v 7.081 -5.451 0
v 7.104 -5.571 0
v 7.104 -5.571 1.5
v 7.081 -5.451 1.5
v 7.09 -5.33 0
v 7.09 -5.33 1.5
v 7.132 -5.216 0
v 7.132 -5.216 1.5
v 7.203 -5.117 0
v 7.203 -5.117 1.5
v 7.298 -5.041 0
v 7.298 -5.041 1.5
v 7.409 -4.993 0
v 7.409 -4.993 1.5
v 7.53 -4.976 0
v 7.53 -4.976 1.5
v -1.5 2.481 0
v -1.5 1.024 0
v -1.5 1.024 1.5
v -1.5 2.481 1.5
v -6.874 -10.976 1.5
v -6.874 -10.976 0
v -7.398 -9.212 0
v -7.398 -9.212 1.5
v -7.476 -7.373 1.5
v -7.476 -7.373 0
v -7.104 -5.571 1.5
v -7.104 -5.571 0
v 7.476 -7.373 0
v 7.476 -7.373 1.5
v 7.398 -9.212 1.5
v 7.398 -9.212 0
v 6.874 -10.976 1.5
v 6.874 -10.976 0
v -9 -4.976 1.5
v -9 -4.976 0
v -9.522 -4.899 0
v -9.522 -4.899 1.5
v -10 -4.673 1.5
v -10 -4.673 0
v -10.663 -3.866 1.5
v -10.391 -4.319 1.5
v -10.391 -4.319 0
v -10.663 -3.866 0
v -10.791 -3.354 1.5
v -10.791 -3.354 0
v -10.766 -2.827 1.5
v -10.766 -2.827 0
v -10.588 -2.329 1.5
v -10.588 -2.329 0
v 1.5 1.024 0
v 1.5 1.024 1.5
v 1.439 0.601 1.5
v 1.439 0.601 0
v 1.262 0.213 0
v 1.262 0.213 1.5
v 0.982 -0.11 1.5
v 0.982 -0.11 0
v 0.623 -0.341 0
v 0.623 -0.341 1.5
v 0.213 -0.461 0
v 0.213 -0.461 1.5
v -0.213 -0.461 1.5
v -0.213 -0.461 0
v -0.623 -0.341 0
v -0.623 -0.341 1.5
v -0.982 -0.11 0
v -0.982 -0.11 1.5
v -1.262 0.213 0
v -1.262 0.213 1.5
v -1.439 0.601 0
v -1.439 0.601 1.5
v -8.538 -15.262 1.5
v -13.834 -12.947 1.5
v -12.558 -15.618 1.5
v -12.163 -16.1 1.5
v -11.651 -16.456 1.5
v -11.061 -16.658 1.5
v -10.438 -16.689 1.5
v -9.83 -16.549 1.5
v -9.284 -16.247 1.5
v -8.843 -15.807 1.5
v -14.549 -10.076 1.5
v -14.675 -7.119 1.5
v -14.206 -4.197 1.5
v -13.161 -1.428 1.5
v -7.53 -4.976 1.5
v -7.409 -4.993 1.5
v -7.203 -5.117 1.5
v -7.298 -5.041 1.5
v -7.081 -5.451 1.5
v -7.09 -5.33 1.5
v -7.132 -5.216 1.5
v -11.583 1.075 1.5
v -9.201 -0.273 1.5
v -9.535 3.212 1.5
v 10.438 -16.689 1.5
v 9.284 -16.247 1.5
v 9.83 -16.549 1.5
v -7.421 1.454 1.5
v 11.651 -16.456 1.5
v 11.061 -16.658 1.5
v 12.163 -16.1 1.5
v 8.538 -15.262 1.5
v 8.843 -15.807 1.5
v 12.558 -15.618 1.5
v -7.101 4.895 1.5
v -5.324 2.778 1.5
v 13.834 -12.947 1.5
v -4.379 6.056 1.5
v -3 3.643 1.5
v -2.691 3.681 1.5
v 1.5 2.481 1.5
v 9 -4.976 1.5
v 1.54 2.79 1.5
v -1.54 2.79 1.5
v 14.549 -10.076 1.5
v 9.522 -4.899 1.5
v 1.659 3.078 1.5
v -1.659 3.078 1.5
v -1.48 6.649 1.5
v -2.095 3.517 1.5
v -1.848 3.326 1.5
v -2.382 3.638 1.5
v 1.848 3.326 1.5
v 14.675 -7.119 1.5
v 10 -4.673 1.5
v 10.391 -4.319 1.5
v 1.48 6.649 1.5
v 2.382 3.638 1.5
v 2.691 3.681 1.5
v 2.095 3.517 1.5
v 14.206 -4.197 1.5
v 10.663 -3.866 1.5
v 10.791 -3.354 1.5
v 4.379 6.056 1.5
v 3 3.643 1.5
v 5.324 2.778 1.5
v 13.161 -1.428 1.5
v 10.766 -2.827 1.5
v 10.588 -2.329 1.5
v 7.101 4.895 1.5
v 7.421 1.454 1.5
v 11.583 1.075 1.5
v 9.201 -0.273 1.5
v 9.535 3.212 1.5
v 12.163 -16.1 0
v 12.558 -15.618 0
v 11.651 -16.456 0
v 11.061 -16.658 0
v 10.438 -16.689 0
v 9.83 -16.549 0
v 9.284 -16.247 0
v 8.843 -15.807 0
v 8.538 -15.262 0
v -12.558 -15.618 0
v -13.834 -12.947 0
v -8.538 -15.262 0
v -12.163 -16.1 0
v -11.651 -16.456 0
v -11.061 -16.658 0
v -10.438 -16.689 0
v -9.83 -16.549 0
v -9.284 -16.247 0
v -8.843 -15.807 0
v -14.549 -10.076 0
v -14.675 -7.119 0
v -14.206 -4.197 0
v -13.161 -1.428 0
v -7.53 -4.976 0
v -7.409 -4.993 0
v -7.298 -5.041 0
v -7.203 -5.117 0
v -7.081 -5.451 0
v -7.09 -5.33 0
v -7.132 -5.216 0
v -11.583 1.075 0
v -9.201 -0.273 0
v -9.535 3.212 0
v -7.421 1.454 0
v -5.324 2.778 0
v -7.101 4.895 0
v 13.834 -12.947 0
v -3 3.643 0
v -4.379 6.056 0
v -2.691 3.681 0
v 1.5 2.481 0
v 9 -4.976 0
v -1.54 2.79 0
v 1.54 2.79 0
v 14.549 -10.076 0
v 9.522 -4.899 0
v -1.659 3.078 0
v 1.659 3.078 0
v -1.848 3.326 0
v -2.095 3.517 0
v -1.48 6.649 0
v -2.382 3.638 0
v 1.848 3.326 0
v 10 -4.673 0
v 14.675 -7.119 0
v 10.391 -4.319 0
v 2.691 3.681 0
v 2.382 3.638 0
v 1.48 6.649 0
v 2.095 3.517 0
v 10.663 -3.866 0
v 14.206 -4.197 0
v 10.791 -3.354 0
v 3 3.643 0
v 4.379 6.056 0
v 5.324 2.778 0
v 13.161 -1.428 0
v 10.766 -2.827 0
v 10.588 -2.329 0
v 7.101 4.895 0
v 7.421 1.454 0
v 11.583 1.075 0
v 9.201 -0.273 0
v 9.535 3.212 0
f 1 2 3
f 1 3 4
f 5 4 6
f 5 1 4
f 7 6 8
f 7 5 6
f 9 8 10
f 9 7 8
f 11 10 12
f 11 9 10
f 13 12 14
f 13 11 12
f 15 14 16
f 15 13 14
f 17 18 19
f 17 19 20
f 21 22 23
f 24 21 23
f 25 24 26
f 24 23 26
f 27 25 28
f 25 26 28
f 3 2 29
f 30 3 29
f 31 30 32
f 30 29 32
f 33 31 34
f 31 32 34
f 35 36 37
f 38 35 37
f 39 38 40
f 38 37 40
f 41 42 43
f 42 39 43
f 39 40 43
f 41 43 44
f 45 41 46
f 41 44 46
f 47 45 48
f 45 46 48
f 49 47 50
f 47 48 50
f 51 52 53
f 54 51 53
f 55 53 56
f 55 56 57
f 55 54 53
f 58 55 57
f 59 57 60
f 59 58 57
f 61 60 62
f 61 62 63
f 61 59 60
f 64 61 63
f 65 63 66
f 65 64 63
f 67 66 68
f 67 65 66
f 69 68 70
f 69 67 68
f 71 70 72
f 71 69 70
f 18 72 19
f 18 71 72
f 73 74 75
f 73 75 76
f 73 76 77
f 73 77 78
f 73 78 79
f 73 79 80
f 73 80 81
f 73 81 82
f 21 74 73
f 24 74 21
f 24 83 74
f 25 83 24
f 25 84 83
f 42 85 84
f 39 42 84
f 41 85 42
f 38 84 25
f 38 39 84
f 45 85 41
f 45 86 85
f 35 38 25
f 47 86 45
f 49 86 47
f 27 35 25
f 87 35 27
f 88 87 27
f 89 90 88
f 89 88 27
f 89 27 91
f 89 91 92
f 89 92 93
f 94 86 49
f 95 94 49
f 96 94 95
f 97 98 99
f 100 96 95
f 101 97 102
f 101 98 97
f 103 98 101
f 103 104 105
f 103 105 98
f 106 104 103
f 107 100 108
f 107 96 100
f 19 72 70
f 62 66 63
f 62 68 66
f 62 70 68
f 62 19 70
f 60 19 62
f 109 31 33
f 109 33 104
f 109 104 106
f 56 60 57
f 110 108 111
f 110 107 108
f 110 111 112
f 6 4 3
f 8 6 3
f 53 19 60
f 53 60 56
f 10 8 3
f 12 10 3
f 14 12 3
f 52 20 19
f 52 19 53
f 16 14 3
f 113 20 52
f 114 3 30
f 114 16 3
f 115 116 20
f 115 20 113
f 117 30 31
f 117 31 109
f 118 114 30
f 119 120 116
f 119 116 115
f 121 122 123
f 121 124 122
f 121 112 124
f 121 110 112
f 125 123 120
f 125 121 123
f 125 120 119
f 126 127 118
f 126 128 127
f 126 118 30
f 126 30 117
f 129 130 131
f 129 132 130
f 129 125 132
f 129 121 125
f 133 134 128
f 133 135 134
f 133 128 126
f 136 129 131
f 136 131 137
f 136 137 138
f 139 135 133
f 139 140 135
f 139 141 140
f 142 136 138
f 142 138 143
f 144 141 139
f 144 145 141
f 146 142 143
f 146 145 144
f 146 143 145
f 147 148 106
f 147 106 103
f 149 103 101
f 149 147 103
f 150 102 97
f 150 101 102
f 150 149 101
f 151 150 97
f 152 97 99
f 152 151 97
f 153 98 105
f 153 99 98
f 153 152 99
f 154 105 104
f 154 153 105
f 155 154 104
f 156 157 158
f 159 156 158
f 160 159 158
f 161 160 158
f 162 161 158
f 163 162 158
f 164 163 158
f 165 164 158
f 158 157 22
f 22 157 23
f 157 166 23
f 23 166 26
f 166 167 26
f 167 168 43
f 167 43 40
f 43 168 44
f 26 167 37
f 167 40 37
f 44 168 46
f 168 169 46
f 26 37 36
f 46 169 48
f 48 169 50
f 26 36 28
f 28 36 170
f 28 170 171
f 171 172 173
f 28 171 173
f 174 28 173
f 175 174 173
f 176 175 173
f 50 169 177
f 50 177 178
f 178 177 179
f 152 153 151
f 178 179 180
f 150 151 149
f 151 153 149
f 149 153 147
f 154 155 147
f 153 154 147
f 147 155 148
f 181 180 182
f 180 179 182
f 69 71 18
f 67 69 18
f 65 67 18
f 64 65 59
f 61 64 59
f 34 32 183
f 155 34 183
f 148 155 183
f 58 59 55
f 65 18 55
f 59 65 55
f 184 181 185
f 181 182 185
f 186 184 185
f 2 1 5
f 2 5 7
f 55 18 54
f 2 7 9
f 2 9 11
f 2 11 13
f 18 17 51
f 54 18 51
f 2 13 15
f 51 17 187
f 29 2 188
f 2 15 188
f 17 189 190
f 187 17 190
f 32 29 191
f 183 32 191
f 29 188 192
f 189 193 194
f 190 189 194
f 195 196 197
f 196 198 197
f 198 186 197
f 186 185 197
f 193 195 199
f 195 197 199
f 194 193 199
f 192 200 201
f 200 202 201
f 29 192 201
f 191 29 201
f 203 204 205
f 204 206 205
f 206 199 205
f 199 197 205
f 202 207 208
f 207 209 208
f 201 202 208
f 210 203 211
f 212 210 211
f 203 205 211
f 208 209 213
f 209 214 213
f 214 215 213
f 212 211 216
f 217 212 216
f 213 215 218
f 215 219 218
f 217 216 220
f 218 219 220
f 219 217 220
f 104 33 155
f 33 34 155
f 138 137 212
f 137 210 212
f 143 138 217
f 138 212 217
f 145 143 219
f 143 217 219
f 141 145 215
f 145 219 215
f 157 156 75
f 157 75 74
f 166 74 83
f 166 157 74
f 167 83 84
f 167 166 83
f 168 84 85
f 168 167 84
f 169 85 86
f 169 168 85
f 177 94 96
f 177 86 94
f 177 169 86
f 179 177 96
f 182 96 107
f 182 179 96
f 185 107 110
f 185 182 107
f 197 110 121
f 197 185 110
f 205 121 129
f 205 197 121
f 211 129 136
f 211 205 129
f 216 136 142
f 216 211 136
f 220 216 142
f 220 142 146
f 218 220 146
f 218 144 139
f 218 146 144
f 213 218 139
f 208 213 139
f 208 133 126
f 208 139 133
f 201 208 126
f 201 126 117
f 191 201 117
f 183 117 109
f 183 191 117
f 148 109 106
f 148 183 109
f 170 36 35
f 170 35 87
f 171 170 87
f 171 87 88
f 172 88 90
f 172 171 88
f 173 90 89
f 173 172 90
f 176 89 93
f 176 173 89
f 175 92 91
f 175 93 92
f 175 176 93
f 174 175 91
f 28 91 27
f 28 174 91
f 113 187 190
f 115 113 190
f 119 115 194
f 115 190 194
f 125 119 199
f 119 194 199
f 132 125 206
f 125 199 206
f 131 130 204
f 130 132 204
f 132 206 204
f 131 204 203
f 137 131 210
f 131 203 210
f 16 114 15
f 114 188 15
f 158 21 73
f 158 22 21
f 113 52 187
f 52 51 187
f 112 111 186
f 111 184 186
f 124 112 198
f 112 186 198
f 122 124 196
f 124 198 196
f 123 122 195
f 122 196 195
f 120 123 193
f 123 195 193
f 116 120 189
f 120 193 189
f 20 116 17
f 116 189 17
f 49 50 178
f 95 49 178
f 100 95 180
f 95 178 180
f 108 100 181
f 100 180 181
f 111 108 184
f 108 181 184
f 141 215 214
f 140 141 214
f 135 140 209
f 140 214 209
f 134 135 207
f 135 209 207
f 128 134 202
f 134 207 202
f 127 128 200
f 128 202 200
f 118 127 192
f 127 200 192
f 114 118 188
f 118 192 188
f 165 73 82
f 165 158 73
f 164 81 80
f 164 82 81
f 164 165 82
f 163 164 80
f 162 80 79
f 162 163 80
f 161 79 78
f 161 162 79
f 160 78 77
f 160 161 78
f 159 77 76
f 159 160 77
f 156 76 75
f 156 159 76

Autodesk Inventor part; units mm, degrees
ref_plane "YZ Plane" through (0, 0, 0) normal (1, 0, 0) x (0, 1, 0)
ref_plane "XZ Plane" through (0, 0, 0) normal (0, 1, 0) x (-1, 0, 0)
sketch "Sketch1" plane through (0, 0, 0) normal (0, 0, 1) x (1, 0, 0)
  circle A0 centre (0, -7.9764) radius 8 construction
  line L0 (-1.5, 0.0236) -> (0, 0.0236) construction
  line L1 (-3.206, 0) -> (3.4858, 0) projected
  line L2 (-6.8739, -10.9764) -> (6.8739, -10.9764) construction
  arc A1 (-7.1037, -5.5707) -> (-6.8739, -10.9764) centre (0, -7.9764) ccw
  line L3 (0, 1.949) -> (0, -3.4788) projected
  arc A2 (-1.5, 1.0236) -> (1.5, 1.0236) centre (0, 1.0236) ccw
  arc A3 (12.5579, -15.6176) -> (-12.5579, -15.6176) centre (0, -7.9764) ccw
  line L4 (-9, -4.9764) -> (-7.5299, -4.9764)
  line L5 (-1.5, 1.0236) -> (-1.5, 2.4807)
  arc A4 (-3, 3.6426) -> (-10.5882, -2.3293) centre (0, -7.9764) ccw
  arc A5 (-1.5, 2.4807) -> (-3, 3.6426) centre (-2.7, 2.4807) ccw
  arc A6 (-10.5882, -2.3293) -> (-9, -4.9764) centre (-9, -3.1764) ccw
  arc A7 (-7.1037, -5.5707) -> (-7.5299, -4.9764) centre (-7.5299, -5.4264) ccw
  line L6 (0, 6.7236) -> (2.5298, 6.7236) construction
  line L7 (-6.8739, -10.9764) -> (-8.5384, -15.2625)
  arc A8 (-12.5579, -15.6176) -> (-8.5384, -15.2625) centre (-10.6358, -14.448) ccw
  line L8 (0, -0.4764) -> (-1.2778, -0.4764) construction
  line L9 (6.8739, -10.9764) -> (8.5384, -15.2625)
  arc A9 (8.5384, -15.2625) -> (12.5579, -15.6176) centre (10.6358, -14.448) ccw
  arc A10 (6.8739, -10.9764) -> (7.1037, -5.5707) centre (0, -7.9764) ccw
  line L10 (9, -4.9764) -> (7.5299, -4.9764)
  line L11 (1.5, 1.0236) -> (1.5, 2.4807)
  arc A11 (10.5882, -2.3293) -> (3, 3.6426) centre (0, -7.9764) ccw
  arc A12 (3, 3.6426) -> (1.5, 2.4807) centre (2.7, 2.4807) ccw
  arc A13 (9, -4.9764) -> (10.5882, -2.3293) centre (9, -3.1764) ccw
  arc A14 (7.5299, -4.9764) -> (7.1037, -5.5707) centre (7.5299, -5.4264) ccw
  point P0 (1.5, 0.0236)
  dimension "d0" = 16
  dimension "d3" = 3
  dimension "d4" = 1.5
  dimension "d5" = 29.4
  dimension "d8" = 12
  dimension "d9" = 3
  dimension "d10" = 1.2
  dimension "d11" = 1.8
  dimension "d12" = 0.45
  dimension "d13" = 2.25
  dimension "d14" = 7.5
  dimension "d15" = 7.5
extrude "Body" add sketch "Sketch1" along normal blind 1.5
ref_plane "Work Plane1" through (0, -7.9764, 0) normal (-1, 0, 0) x (0, 0, 1)
equation "\"d0\" = WD"
equation "\"d3\" = 0.2 * ND"
equation "\"d4\" = 0.1 * ND"
equation "\"d5\" = SD2"
equation "\"d8\" = 0.8 * ND"
equation "\"d9\" = 0.2 * ND"
equation "\"d10\" = 0.08 * ND"
equation "\"d11\" = 0.12 * ND"
equation "\"d12\" = 0.03 * ND"
equation "\"d13\" = 0.15 * ND"
equation "\"d14\" = 0.5 * ND"
equation "\"d15\" = 0.5 * ND"
equation "\"d16\" = SD"
equation "\"ND\" = 15"
equation "\"SD\" = 1.5"
equation "\"WD\" = 16"
equation "\"d1\" = 1.6 * ND"
equation "\"d2\" = ND"
equation "\"SD2\" = 29.4"
equation "\"d6\" = ND"
equation "\"d7\" = 0.15 * ND"
equation "\"WDMIN\" = 13"
equation "\"SNB\" = 1.55"
equation "\"WDMAX\" = 18"
equation "\"BUBRMI\" = 2.5"
properties part number "DIN 6799 - 15" material "Steel, Mild"
